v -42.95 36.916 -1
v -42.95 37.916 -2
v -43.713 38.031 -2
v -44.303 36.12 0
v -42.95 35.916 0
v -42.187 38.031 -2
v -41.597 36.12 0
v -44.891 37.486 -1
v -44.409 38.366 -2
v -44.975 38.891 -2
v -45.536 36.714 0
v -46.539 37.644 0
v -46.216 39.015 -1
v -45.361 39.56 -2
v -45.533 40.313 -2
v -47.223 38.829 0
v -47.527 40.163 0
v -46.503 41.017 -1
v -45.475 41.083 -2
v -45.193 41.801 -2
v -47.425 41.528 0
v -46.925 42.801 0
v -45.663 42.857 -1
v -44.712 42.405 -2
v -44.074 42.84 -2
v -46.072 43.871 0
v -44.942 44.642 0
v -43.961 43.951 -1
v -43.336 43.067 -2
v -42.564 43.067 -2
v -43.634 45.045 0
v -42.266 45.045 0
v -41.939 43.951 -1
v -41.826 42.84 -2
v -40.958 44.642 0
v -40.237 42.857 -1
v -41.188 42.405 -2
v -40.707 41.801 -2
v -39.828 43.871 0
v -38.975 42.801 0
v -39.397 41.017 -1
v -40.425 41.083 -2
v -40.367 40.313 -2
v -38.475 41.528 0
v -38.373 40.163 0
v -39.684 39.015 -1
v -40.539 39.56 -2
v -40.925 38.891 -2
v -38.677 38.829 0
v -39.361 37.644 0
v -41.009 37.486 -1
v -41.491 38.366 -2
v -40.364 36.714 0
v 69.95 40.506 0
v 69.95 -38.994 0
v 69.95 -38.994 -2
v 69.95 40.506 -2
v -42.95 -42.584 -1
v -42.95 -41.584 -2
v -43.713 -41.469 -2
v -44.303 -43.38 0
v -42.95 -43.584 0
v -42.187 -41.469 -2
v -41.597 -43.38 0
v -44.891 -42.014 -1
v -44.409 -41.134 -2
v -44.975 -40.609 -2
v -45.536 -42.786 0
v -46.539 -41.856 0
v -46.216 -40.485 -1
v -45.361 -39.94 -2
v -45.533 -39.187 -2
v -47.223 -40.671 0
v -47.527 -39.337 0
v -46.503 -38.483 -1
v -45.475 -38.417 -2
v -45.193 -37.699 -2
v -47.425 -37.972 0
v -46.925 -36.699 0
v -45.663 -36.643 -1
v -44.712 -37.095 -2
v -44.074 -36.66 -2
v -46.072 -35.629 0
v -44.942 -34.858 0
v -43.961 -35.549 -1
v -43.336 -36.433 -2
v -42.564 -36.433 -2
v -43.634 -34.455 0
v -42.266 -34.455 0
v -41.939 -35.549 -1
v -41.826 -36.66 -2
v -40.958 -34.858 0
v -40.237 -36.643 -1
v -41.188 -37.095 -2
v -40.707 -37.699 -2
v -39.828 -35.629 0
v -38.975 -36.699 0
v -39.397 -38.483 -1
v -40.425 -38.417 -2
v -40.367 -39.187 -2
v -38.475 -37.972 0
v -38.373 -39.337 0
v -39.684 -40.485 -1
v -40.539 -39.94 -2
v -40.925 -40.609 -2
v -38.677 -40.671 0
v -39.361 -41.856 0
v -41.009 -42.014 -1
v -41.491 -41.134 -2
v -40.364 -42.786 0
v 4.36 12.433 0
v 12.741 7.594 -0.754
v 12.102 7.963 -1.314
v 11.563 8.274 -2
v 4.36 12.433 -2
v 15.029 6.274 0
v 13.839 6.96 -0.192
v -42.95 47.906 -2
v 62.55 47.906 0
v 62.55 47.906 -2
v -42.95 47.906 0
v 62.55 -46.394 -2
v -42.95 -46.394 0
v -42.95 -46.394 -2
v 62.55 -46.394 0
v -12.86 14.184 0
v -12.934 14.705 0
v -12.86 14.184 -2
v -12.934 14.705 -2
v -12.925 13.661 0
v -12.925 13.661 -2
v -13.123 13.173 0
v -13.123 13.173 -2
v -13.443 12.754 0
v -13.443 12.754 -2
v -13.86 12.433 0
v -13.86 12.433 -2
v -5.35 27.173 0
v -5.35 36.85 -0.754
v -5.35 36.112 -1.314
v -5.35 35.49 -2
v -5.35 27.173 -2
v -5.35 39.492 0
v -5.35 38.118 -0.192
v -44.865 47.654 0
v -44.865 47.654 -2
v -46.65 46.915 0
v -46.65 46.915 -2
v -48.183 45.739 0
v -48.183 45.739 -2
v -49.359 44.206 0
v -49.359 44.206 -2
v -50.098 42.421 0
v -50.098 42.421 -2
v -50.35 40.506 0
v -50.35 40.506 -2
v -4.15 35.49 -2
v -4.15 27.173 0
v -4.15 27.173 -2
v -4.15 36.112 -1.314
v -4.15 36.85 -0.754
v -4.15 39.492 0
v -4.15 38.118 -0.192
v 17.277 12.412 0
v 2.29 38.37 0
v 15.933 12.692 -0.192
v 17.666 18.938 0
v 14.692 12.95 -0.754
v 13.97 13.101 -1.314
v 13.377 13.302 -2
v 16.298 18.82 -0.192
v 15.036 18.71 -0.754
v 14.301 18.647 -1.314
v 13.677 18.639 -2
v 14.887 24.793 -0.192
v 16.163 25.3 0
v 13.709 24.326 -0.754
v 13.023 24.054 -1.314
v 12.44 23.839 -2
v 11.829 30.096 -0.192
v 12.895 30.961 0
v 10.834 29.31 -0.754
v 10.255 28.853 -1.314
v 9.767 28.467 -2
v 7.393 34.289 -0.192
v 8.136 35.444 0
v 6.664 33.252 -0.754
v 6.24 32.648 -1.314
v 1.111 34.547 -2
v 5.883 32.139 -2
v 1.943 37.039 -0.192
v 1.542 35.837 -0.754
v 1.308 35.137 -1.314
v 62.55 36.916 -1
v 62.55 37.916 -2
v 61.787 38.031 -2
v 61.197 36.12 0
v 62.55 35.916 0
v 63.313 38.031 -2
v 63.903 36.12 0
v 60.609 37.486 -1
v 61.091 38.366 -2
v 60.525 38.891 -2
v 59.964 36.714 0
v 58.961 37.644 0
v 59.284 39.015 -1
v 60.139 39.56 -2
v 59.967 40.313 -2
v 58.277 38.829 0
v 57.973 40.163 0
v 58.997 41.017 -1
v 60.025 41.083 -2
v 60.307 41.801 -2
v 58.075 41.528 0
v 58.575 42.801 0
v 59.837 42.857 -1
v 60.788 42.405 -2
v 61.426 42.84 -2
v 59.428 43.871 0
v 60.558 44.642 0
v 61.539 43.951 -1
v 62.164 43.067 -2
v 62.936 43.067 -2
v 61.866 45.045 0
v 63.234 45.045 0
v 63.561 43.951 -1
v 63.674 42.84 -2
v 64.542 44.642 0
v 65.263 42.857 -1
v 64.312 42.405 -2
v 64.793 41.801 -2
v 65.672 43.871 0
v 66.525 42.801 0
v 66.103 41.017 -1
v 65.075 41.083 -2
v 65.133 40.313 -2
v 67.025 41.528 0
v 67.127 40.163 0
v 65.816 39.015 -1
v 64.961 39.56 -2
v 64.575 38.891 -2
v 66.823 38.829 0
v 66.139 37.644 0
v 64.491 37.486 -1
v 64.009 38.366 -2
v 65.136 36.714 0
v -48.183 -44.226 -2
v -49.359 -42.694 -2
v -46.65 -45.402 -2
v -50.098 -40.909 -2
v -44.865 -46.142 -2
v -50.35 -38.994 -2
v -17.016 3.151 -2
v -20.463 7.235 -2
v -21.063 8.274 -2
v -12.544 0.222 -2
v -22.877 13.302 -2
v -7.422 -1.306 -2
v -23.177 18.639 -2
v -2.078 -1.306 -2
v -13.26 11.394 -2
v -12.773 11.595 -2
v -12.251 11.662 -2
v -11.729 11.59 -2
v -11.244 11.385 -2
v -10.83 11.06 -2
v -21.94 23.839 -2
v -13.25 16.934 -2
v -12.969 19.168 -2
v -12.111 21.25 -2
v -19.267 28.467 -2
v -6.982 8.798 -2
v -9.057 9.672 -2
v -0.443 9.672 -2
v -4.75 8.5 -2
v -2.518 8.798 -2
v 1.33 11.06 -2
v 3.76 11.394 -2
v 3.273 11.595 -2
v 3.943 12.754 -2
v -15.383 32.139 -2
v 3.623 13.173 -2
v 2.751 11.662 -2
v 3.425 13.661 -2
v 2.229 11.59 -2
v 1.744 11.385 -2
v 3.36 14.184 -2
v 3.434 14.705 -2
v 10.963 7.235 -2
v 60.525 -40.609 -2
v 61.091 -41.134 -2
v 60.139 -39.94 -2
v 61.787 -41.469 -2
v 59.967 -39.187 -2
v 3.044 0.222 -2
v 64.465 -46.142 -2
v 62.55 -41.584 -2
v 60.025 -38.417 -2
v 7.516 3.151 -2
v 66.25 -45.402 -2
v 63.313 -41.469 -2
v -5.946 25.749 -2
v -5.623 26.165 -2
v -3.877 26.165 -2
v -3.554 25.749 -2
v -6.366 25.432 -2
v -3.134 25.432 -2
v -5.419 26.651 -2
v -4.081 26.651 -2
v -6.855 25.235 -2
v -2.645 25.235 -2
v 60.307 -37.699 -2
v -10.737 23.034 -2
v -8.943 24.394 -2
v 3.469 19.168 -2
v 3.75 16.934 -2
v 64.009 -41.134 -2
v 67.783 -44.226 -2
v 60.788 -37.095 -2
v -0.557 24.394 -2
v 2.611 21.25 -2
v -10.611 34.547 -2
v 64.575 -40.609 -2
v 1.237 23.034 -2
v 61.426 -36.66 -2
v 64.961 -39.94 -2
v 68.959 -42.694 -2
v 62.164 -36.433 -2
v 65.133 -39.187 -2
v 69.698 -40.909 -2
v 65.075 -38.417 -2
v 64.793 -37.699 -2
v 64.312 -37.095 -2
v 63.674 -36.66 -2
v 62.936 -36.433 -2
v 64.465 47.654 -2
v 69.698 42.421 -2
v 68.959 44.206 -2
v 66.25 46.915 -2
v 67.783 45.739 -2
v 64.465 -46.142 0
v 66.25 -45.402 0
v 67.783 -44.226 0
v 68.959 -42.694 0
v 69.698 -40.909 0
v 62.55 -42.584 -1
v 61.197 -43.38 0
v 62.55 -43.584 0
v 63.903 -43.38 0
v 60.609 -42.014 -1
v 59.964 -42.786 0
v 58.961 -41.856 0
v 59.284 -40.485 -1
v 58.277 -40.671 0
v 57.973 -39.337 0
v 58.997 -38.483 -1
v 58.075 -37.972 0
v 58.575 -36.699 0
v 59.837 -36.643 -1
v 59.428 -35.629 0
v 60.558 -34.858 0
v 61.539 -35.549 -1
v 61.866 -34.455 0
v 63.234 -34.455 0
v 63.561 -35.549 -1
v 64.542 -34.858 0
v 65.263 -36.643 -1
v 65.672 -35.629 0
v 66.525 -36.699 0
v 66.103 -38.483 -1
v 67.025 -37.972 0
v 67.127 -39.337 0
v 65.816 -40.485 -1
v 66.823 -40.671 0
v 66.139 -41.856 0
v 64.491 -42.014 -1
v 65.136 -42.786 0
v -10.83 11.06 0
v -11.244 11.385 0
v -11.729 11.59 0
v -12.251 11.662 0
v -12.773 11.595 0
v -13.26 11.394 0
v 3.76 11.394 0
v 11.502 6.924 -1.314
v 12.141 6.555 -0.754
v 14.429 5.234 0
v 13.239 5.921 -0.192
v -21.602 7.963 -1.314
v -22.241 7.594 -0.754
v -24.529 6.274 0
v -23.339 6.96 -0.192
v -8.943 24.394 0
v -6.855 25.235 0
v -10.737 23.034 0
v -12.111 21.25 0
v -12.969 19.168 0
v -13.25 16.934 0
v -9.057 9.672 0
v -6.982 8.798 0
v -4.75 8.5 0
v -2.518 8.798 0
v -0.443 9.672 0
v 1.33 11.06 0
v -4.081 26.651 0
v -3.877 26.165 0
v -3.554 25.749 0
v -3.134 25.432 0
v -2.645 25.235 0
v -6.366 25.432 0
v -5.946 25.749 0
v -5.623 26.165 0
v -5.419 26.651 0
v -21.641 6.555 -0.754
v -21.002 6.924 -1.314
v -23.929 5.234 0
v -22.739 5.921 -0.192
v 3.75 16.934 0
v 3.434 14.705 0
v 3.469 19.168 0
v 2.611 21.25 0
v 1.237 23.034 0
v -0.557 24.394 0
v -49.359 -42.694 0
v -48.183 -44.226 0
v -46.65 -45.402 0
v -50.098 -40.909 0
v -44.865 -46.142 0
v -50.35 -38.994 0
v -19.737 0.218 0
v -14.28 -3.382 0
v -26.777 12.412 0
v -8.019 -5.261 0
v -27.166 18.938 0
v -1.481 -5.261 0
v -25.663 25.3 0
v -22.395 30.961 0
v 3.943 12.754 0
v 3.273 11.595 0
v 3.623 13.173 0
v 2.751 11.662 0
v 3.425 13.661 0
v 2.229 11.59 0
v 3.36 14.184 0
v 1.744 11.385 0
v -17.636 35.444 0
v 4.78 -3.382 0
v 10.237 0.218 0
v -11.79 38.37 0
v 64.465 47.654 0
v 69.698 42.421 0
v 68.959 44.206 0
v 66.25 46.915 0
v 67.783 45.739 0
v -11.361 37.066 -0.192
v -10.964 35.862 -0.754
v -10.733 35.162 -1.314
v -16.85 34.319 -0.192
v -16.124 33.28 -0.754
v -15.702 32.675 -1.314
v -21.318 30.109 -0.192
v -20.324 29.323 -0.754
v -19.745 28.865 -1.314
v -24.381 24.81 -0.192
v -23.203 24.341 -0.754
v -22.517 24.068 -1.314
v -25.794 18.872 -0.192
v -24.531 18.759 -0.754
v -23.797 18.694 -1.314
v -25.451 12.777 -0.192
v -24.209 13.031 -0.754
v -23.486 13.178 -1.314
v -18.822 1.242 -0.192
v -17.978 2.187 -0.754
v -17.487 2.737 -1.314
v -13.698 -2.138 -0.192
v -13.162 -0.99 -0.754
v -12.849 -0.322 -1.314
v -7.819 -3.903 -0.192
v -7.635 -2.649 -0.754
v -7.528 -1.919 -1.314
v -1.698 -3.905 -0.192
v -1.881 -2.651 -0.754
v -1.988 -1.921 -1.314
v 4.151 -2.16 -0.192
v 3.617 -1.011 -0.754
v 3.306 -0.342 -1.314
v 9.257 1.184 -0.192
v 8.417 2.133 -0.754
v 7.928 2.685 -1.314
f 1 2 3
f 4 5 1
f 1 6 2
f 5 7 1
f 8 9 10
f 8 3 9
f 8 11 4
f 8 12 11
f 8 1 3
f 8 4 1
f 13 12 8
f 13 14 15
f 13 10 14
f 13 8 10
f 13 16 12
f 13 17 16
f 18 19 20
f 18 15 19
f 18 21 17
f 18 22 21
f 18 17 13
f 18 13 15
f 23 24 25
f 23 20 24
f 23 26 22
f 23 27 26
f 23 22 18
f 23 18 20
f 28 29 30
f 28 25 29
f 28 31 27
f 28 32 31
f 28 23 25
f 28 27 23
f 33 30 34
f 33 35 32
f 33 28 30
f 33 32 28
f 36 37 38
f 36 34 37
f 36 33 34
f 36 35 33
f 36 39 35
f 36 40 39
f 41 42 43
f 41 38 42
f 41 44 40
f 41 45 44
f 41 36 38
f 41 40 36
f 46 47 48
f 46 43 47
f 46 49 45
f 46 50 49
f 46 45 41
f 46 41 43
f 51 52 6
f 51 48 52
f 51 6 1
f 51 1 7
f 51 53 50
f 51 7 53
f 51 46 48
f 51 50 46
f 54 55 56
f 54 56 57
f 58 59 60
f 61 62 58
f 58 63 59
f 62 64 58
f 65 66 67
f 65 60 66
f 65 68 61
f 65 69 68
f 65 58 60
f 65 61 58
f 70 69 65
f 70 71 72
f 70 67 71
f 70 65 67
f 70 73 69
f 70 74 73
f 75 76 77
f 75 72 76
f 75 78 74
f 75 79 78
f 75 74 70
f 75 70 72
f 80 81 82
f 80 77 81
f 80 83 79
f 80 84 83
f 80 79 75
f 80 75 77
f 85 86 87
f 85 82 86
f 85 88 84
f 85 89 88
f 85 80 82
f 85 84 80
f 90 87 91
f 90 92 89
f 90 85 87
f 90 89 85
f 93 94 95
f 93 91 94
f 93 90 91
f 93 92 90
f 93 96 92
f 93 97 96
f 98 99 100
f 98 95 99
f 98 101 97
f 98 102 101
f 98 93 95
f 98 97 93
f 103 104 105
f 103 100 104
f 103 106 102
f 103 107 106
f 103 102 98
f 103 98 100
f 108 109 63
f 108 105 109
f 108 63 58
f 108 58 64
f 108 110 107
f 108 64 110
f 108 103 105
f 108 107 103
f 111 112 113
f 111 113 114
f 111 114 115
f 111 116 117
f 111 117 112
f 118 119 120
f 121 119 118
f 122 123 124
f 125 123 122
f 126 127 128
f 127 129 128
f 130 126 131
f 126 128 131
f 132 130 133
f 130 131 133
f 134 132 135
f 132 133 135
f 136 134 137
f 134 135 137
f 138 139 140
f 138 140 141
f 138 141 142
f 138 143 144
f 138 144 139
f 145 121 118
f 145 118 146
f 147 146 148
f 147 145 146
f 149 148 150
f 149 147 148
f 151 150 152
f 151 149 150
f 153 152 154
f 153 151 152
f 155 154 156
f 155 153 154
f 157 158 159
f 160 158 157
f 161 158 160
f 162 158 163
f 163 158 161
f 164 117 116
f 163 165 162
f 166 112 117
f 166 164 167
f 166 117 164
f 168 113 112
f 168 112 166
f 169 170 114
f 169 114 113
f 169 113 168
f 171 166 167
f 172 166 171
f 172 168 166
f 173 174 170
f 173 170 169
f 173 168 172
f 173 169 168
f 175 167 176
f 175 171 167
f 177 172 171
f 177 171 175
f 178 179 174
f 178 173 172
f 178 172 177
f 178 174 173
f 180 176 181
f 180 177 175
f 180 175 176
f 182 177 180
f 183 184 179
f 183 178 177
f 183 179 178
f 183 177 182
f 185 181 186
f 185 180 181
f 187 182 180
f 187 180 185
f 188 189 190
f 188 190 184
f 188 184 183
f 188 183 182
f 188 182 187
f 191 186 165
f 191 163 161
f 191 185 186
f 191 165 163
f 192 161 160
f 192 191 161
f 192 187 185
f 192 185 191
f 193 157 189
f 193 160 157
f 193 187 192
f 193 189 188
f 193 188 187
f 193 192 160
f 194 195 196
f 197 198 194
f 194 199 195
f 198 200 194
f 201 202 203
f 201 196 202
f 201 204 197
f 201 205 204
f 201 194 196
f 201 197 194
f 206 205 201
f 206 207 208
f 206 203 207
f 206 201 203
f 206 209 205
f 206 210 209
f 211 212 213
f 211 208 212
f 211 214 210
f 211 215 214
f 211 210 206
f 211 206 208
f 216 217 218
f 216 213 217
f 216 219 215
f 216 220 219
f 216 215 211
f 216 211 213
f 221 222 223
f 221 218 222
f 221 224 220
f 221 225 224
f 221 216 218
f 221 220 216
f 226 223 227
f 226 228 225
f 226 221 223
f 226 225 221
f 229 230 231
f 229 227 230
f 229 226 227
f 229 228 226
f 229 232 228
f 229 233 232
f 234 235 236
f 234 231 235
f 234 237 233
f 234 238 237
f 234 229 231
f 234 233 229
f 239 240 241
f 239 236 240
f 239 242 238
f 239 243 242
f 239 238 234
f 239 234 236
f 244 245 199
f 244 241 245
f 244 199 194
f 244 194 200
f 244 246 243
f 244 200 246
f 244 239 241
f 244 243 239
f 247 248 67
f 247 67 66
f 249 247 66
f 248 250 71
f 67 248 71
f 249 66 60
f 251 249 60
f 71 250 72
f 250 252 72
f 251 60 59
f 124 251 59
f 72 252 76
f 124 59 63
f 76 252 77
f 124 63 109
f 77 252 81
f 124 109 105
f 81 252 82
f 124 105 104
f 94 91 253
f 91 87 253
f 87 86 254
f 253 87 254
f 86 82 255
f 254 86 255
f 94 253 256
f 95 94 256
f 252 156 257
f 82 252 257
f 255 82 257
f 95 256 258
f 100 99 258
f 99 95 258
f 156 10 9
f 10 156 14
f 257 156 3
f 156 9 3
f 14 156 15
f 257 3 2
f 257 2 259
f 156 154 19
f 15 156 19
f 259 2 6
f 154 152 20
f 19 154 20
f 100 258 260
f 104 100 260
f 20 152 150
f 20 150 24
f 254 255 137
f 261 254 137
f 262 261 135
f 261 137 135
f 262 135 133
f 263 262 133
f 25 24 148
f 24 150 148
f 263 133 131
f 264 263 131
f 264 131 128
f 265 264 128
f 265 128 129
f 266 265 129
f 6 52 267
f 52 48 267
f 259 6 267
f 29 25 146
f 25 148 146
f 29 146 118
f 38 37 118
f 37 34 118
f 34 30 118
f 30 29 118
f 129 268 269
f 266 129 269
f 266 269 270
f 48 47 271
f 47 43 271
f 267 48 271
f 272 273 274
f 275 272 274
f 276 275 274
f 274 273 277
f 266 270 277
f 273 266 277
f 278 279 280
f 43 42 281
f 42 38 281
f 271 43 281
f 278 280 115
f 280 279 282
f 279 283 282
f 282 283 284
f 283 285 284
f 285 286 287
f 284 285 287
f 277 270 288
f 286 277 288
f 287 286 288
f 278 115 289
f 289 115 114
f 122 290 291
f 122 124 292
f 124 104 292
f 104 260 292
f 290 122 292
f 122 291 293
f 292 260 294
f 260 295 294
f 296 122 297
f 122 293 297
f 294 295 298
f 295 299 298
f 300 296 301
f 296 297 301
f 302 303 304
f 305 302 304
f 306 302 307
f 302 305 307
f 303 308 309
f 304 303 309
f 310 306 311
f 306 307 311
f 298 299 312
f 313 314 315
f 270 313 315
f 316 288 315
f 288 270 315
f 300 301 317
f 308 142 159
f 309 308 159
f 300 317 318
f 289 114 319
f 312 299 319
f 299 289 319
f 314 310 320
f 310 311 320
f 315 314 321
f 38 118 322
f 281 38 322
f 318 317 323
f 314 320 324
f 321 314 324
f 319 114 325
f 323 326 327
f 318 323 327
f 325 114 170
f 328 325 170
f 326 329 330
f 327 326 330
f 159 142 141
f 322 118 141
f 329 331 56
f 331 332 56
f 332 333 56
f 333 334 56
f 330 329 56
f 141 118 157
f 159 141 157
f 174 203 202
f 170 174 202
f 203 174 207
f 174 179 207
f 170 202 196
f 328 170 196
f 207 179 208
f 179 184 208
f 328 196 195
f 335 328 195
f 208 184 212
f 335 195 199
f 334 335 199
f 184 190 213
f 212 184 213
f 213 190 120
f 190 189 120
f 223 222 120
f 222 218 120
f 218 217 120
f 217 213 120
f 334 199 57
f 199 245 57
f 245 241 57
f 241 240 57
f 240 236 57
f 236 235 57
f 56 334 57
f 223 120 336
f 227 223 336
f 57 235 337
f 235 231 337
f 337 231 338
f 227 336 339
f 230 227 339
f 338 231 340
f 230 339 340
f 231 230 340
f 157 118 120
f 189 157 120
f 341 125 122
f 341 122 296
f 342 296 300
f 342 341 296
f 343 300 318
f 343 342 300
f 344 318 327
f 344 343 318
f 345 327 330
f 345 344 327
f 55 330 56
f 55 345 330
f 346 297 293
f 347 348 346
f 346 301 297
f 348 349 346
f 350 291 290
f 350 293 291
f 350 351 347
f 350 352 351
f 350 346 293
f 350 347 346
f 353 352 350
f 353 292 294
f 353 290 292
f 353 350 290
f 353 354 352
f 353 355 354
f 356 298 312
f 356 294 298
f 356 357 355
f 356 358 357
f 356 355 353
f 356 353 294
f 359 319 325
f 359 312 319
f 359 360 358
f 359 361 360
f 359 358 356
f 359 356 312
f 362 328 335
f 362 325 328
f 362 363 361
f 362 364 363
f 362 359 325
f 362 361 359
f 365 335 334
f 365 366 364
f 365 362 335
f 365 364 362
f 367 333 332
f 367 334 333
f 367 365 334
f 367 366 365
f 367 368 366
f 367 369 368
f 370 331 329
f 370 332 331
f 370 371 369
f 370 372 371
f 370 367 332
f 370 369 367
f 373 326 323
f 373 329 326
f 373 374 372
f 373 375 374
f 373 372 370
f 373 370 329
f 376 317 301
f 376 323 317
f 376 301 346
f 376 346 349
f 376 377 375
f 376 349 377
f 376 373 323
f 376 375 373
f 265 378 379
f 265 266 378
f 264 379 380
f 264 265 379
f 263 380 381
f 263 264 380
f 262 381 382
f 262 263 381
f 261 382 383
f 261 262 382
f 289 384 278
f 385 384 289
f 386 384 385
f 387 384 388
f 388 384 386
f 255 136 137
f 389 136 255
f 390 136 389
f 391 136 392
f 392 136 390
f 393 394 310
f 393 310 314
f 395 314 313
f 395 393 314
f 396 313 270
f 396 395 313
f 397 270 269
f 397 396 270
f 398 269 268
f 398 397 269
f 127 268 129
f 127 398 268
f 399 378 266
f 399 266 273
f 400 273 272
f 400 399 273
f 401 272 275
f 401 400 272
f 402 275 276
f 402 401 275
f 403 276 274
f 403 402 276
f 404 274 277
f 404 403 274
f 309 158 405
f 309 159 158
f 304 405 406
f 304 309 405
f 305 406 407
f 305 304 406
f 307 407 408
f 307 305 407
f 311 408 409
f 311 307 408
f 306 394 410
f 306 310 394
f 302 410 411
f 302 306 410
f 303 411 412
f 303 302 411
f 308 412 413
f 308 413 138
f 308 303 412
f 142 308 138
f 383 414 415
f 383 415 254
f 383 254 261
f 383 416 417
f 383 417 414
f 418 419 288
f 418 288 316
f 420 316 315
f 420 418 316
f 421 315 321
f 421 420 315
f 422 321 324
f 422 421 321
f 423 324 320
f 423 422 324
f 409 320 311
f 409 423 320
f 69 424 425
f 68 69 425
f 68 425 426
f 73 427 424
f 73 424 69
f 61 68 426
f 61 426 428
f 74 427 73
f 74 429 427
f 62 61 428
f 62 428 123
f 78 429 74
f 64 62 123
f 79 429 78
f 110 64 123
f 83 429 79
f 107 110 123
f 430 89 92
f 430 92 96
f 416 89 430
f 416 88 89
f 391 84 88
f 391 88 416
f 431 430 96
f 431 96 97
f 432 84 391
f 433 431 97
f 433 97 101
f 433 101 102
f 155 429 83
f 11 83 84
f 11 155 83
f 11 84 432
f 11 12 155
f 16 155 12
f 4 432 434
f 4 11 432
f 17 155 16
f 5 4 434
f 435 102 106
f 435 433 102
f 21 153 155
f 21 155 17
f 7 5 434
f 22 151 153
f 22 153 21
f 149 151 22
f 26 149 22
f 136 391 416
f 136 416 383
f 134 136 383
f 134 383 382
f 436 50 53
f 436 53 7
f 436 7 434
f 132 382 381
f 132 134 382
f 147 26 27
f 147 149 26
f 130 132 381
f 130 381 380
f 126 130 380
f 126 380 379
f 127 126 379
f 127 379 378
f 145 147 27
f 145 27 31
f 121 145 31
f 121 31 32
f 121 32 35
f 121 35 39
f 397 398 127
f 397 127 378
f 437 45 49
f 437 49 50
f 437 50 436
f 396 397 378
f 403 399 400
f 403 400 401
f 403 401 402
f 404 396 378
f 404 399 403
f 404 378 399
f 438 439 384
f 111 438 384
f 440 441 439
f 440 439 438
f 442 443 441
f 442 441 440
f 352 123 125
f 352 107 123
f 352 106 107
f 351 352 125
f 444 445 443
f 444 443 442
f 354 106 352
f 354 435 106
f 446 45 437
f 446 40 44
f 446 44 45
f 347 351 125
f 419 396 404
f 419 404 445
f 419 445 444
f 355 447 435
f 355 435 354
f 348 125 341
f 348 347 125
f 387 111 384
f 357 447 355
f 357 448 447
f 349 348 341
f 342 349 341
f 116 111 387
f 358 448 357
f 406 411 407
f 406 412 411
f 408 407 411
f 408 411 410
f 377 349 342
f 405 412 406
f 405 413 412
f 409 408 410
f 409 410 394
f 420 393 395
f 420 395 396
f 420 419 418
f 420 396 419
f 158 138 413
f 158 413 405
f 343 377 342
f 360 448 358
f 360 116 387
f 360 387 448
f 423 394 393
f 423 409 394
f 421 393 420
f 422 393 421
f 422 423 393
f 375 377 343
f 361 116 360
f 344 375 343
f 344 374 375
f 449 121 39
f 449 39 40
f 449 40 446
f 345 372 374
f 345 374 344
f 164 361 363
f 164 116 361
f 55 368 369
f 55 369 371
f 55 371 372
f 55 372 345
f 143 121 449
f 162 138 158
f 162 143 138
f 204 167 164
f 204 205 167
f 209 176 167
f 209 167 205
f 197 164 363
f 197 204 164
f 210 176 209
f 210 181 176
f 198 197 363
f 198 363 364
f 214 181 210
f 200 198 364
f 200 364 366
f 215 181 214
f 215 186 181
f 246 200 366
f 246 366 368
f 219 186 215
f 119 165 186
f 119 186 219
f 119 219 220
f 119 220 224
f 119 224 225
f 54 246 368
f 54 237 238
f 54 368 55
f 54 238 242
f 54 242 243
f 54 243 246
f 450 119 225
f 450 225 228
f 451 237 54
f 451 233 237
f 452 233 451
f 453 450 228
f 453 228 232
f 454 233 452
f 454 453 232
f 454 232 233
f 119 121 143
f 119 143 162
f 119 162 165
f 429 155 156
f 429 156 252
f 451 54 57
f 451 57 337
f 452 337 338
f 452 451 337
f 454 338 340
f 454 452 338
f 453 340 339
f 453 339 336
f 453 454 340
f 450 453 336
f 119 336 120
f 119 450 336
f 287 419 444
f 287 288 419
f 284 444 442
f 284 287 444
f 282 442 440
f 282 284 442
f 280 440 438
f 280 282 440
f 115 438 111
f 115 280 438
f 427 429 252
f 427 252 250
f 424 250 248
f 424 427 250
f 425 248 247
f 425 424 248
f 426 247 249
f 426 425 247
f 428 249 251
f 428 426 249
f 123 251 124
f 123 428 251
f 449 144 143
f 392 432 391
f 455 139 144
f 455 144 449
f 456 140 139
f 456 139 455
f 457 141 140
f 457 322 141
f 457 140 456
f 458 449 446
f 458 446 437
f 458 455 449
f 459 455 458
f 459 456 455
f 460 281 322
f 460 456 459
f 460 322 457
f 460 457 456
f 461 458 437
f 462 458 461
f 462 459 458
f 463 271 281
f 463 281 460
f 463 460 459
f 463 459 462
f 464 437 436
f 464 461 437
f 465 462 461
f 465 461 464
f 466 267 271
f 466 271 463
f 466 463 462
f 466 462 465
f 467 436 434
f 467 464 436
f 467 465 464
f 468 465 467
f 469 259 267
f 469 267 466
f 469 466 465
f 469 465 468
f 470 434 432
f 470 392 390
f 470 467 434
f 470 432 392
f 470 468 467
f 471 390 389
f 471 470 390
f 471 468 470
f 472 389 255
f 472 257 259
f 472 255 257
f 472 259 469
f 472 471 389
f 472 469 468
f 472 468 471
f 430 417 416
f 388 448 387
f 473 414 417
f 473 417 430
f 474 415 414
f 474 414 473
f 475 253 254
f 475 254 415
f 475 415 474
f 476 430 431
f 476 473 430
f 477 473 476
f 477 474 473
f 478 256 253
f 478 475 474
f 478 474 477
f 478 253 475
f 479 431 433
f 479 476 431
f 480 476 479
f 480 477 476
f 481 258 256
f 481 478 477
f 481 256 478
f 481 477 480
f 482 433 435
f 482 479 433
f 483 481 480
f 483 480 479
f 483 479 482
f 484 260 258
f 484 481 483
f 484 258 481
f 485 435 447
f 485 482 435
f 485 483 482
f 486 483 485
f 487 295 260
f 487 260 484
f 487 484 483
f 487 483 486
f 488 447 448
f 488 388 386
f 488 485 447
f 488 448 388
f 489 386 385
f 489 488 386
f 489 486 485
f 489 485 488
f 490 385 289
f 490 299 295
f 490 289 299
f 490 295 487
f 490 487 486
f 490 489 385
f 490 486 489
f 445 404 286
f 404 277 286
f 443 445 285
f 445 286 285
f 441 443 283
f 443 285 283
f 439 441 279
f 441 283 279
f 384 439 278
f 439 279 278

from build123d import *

# Parameters (mm, degrees)
SKETCH1_R                                    = 18.5
SKETCH1_R_2                                  = 2.125
MAIN_DEPTH                                   = 2
INLET_FILLET_R                               = 5
SKETCH20_R                                   = 8.5
FAN_PROTECTION_RIBS_DEPTH                    = 2
FAN_PROTECTION_RIBS_FILLETS_R                = 2
CSK_FOR_M4_HEX_SOCKET_COUNTERSUNK_HE_2_COUNT = 2
CSK_FOR_M4_HEX_SOCKET_COUNTERSUNK_HE_2_PITCH = 79.5
CSK_FOR_M4_HEX_SOCKET_COUNTERSUNK_HE_3_COUNT = 2
CSK_FOR_M4_HEX_SOCKET_COUNTERSUNK_HE_3_PITCH = 105.5
CSK_FOR_M4_HEX_SOCKET_COUNTERSUNK_HE_4_COUNT = 2
CSK_FOR_M4_HEX_SOCKET_COUNTERSUNK_HE_4_PITCH = 132.10034065


with BuildPart() as part:
    # Sketch1 → Main (new body)
    with BuildSketch(Plane.XY):
        with BuildLine():
            Line((-42.95, -46.393826455), (62.55, -46.393826455))
            ThreePointArc((62.55, -46.393826455), (67.782590181, -44.226416636), (69.95, -38.993826455))
            Line((69.95, -38.993826455), (69.95, 40.506173545))
            ThreePointArc((69.95, 40.506173545), (67.782590181, 45.738763726), (62.55, 47.906173545))
            Line((62.55, 47.906173545), (11.070508076, 47.906173545))
            Line((11.070508076, 47.906173545), (-23.570508076, 47.906173545))
            Line((-23.570508076, 47.906173545), (-42.95, 47.906173545))
            ThreePointArc((-42.95, 47.906173545), (-48.182590181, 45.738763726), (-50.35, 40.506173545))
            Line((-50.35, 40.506173545), (-50.35, -38.993826455))
            ThreePointArc((-50.35, -38.993826455), (-48.182590181, -44.226416636), (-42.95, -46.393826455))
        make_face()
        with Locations((-4.75, 17)):
            Circle(SKETCH1_R, mode=Mode.SUBTRACT)
        with Locations((-42.95, 40.506173545)):
            Circle(SKETCH1_R_2, mode=Mode.SUBTRACT)
        with Locations((-42.95, -38.993826455)):
            Circle(SKETCH1_R_2, mode=Mode.SUBTRACT)
        with Locations((62.55, 40.506173545)):
            Circle(SKETCH1_R_2, mode=Mode.SUBTRACT)
        with Locations((62.55, -38.993826455)):
            Circle(SKETCH1_R_2, mode=Mode.SUBTRACT)
    extrude(amount=-MAIN_DEPTH)

    # Inlet Fillet
    # the kernel refuses this fillet: 5 mm, written as the material it takes off along each edge
    with BuildSketch(Plane(origin=(-4.75, 17, 0), x_dir=(1, 0, 0), z_dir=(0, -1, 0))) as inlet_fillet_piece_1:
        with BuildLine():
            CenterArc((22.5, -5), INLET_FILLET_R, 90, 53.130102354)
            Line((22.5, 0), (22.5, 0.1))
            Line((22.5, 0.1), (18.5, 0.1))
            Line((18.5, 0.1), (18.4, 0))
            ThreePointArc((18.4, 0), (18.4, -1), (18.42, -1.94))
            Line((18.42, -1.94), (18.5, -2))
        make_face()
    revolve(axis=Axis((-4.75, 17, 0), (0, 0, 1)), mode=Mode.SUBTRACT)

    # Sketch20 → Fan Protection Ribs (add, through all)
    with BuildSketch(Plane.XY):
        with Locations((-4.75, 17)):
            Circle(SKETCH20_R)
        with BuildLine():
            ThreePointArc((-5.35, 25.478797084), (-4.75, 25.5), (-4.15, 25.478797084))
            Line((-4.15, 25.478797084), (-4.15, 39.491998577))
            ThreePointArc((-4.15, 39.491998577), (-4.75, 39.5), (-5.35, 39.491998577))
            Line((-5.35, 39.491998577), (-5.35, 25.478797084))
        make_face()
        with BuildLine():
            Line((15.02864215, 6.273615954), (2.892853669, 13.2802167))
            ThreePointArc((2.892853669, 13.2802167), (2.611215932, 12.75), (2.292853669, 12.240986215))
            Line((2.292853669, 12.240986215), (14.42864215, 5.234385469))
            ThreePointArc((14.42864215, 5.234385469), (14.735571585, 5.75), (15.02864215, 6.273615954))
        make_face()
        with BuildLine():
            ThreePointArc((-11.792853669, 12.240986215), (-12.111215932, 12.75), (-12.392853669, 13.2802167))
            Line((-12.392853669, 13.2802167), (-24.52864215, 6.273615954))
            ThreePointArc((-24.52864215, 6.273615954), (-24.235571585, 5.75), (-23.92864215, 5.234385469))
            Line((-23.92864215, 5.234385469), (-11.792853669, 12.240986215))
        make_face()
    extrude(amount=-FAN_PROTECTION_RIBS_DEPTH)

    # Fan Protection Ribs Fillets
    fan_protection_ribs_fillets_edges = [part.edges().sort_by_distance(p)[0] for p in [
        (-4.15, 25.478797084, -1),
        (2.892853669, 13.2802167, -1),
        (2.292853669, 12.240986215, -1),
        (-11.792853669, 12.240986215, -1),
        (-12.392853669, 13.2802167, -1),
        (-5.35, 25.478797084, -1),
    ]]
    fillet(fan_protection_ribs_fillets_edges, radius=FAN_PROTECTION_RIBS_FILLETS_R)

    # Sketch23 → CSK for M4 Hex Socket Countersunk Head Screw3 (revolve, cut)
    with BuildSketch(Plane(origin=(-42.95, 40.506173545, 0), x_dir=(0, -1, 0), z_dir=(1, 0, 0))):
        Polygon((0, 0), (0, 2), (2.15, 2), (2.15, 2.44), (4.59, 0), align=None)
    csk_for_m4_hex_socket_countersunk_head_s = revolve(axis=Axis((-42.95, 40.506173545, 6.35), (0, 0, -1)), mode=Mode.SUBTRACT)

    # CSK for M4 Hex Socket Countersunk He 2: CSK for M4 Hex Socket Countersunk Head Screw3 ×2
    with Locations(*[(0, -i * CSK_FOR_M4_HEX_SOCKET_COUNTERSUNK_HE_2_PITCH, 0) for i in range(1, CSK_FOR_M4_HEX_SOCKET_COUNTERSUNK_HE_2_COUNT)]):
        add(csk_for_m4_hex_socket_countersunk_head_s, mode=Mode.SUBTRACT)

    # CSK for M4 Hex Socket Countersunk He 3: CSK for M4 Hex Socket Countersunk Head Screw3 ×2
    with Locations(*[(i * CSK_FOR_M4_HEX_SOCKET_COUNTERSUNK_HE_3_PITCH, 0, 0) for i in range(1, CSK_FOR_M4_HEX_SOCKET_COUNTERSUNK_HE_3_COUNT)]):
        add(csk_for_m4_hex_socket_countersunk_head_s, mode=Mode.SUBTRACT)

    # CSK for M4 Hex Socket Countersunk He 4: CSK for M4 Hex Socket Countersunk Head Screw3 ×2
    with Locations(*[Vector(0.7986353364447739, -0.6018152535303031, 0) * (i * CSK_FOR_M4_HEX_SOCKET_COUNTERSUNK_HE_4_PITCH) for i in range(1, CSK_FOR_M4_HEX_SOCKET_COUNTERSUNK_HE_4_COUNT)]):
        add(csk_for_m4_hex_socket_countersunk_head_s, mode=Mode.SUBTRACT)


solid = part.part
